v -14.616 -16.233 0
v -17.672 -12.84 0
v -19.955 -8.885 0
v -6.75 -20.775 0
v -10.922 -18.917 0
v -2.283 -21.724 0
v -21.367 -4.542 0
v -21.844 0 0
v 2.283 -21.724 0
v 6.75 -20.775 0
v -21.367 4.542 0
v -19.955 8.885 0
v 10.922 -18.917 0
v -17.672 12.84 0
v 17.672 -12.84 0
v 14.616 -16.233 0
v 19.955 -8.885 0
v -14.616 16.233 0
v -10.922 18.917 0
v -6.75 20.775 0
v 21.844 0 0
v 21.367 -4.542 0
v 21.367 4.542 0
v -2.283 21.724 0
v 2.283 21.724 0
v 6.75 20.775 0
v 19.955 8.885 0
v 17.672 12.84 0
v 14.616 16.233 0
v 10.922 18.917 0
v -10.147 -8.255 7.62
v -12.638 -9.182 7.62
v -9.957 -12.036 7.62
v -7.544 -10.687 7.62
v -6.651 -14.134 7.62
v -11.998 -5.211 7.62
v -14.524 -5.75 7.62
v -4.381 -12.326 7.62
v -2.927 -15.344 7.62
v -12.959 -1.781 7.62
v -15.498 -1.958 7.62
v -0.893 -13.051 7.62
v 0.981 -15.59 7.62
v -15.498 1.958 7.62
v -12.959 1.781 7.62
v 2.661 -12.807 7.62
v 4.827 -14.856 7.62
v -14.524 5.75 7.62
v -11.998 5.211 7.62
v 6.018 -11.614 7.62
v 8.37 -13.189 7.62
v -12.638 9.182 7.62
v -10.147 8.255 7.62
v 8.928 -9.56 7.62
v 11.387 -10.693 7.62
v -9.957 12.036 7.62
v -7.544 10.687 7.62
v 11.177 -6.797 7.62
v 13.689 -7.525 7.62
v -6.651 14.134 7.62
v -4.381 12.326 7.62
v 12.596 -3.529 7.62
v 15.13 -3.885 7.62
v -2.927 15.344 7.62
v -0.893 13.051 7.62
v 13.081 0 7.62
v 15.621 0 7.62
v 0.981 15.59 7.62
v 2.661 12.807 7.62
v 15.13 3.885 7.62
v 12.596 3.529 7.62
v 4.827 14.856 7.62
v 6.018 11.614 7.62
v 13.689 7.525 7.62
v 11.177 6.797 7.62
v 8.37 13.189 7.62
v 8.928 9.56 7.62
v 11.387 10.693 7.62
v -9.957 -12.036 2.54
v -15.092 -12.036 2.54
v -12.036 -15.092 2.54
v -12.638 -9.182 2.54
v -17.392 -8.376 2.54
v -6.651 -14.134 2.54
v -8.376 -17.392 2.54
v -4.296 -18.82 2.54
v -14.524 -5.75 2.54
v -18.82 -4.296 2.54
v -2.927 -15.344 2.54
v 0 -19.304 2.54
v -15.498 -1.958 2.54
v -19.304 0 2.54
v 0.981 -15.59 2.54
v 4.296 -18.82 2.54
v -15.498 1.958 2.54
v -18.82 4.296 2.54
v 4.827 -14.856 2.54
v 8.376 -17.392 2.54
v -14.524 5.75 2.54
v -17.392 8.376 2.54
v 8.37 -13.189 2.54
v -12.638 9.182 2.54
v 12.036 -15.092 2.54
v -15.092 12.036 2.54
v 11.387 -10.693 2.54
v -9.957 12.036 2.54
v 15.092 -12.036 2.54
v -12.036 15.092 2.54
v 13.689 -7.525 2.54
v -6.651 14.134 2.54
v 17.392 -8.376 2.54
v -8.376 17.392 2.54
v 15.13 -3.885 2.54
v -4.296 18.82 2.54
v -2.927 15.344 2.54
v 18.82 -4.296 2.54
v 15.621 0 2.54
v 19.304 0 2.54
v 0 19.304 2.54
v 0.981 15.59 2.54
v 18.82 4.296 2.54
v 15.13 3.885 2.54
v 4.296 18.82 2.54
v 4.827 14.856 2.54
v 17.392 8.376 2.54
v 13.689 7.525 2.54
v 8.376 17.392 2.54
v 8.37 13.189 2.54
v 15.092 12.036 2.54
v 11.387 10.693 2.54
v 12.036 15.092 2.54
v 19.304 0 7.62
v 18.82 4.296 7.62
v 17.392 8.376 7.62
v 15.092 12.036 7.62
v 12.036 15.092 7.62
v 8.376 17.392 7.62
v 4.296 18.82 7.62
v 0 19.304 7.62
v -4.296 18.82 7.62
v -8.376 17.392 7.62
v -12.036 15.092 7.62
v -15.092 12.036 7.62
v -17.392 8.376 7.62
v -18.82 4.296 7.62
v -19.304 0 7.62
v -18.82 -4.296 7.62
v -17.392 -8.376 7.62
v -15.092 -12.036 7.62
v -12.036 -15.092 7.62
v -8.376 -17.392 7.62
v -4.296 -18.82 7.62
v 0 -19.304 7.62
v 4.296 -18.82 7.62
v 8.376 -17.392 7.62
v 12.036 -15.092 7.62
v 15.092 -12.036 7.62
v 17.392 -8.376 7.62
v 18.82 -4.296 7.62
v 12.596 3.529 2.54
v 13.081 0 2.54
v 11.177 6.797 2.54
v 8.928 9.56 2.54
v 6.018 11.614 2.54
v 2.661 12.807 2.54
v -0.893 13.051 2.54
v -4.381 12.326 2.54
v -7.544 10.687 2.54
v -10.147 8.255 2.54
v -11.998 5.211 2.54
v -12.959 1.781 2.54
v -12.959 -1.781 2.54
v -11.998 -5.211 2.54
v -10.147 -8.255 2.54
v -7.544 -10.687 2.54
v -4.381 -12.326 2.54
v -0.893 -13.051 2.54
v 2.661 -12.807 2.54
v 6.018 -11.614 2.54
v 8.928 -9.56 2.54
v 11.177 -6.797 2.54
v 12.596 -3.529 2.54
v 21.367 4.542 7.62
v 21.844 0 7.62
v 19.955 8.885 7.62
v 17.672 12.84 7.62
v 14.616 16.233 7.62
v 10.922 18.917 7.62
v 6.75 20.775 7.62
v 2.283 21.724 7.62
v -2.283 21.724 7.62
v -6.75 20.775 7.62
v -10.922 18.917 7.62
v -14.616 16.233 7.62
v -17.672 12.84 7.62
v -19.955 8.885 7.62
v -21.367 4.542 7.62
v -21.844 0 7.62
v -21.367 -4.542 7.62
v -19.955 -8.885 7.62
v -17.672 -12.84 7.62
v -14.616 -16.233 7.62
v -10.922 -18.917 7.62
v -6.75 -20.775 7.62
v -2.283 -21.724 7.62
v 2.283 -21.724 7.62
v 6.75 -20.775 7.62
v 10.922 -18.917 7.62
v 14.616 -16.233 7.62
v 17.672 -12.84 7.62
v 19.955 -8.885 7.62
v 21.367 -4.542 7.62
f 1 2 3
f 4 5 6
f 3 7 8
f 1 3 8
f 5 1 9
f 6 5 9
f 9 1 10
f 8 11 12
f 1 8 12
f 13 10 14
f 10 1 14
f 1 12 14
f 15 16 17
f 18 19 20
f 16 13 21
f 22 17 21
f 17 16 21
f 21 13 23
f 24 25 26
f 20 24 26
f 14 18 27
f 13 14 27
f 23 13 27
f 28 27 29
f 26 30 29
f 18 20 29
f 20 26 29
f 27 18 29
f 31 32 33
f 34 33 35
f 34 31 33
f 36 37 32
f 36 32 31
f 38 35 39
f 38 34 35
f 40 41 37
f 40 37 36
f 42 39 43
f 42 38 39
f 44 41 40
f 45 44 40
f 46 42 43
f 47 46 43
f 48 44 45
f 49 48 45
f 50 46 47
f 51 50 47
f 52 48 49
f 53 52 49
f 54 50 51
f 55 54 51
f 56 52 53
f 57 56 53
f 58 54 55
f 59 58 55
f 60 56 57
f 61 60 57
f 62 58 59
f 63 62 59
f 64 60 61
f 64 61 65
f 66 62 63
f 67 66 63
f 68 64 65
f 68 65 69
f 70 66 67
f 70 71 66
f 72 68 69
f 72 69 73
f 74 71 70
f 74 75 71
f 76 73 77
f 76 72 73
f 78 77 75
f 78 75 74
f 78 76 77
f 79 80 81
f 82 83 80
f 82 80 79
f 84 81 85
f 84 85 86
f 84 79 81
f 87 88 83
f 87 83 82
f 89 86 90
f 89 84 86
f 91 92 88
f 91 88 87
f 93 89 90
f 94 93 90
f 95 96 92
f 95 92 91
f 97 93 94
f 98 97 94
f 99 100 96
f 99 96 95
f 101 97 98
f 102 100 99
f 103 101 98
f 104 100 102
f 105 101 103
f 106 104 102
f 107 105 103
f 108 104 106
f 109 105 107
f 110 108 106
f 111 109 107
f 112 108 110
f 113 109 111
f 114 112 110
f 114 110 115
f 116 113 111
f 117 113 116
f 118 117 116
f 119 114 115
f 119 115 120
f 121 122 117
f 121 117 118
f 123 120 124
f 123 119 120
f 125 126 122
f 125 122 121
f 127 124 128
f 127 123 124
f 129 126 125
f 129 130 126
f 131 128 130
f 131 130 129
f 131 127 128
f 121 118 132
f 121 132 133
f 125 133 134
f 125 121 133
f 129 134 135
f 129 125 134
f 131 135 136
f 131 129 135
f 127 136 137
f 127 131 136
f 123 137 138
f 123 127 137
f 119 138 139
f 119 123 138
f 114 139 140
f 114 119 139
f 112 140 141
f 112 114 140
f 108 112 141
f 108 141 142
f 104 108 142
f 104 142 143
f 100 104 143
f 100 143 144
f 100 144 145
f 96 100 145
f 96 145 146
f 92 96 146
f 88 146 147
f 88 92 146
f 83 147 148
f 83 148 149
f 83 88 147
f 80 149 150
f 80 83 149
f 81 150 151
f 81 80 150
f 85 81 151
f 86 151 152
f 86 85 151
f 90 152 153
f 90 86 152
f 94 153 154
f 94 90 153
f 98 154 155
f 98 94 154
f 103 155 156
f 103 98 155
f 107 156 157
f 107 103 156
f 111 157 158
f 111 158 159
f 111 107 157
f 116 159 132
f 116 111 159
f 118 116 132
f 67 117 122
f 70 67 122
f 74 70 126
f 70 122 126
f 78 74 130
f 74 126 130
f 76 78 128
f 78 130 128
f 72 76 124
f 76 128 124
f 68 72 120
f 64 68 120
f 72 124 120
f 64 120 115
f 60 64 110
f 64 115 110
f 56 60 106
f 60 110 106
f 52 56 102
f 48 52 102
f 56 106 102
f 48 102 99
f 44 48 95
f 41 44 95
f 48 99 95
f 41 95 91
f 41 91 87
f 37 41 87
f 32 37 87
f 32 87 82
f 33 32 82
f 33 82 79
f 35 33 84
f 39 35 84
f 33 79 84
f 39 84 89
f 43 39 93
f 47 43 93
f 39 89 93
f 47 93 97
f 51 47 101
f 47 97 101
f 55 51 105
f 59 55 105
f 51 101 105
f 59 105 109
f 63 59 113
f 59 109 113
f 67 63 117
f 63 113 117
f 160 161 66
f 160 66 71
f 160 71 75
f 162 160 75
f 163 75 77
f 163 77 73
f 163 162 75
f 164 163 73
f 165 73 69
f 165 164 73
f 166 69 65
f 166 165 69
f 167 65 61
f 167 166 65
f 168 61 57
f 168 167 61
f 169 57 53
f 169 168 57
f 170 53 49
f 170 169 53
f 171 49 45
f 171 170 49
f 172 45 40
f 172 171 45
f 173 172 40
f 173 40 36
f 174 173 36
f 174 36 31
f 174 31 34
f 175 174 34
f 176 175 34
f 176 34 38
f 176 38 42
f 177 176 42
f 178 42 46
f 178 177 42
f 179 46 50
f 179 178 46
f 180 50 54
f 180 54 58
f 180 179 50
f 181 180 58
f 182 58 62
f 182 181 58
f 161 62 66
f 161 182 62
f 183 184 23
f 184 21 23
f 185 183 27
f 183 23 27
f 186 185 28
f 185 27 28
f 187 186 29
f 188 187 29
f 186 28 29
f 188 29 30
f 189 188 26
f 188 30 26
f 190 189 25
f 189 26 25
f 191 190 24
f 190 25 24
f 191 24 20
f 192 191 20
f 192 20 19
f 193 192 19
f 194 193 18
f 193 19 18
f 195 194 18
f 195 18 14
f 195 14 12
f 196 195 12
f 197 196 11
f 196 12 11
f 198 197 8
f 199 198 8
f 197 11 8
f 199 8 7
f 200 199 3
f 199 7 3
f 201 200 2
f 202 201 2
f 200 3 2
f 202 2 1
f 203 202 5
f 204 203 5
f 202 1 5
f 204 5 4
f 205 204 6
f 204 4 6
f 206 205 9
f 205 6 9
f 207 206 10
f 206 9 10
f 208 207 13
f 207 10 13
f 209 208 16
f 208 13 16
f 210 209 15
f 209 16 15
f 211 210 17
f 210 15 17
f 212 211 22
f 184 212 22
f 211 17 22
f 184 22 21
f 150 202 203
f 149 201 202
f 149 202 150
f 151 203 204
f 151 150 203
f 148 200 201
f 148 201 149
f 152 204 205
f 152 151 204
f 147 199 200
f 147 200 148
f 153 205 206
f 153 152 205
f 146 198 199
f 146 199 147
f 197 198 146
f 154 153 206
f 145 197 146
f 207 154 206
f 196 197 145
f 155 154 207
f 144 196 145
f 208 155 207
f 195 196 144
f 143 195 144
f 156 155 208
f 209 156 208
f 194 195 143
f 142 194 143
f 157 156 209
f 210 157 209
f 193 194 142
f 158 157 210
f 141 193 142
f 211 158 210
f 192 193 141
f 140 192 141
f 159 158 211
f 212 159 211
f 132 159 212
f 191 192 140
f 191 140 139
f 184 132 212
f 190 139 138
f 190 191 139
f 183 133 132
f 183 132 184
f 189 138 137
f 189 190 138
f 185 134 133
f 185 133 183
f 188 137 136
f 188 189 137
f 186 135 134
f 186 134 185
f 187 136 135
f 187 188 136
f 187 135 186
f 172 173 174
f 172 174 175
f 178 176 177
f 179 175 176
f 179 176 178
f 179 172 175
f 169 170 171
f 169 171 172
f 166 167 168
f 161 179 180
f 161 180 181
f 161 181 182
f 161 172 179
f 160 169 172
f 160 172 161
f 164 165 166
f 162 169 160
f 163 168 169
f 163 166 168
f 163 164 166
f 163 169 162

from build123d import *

# Parameters (mm, degrees)
F0_R     = 21.844
F1_DEPTH = 2.54
F2_R     = 21.844
F2_R_2   = 19.304
F3_R     = 15.621
F3_R_2   = 13.081
F4_DEPTH = 5.08


with BuildPart() as f1:
    # F0 (on Top) → F1 (new body)
    with BuildSketch(Plane.XY):
        Circle(F0_R)
    extrude(amount=F1_DEPTH)

    # F2 (on face) + F3 (on face) → F4 (join)
    with BuildSketch(Plane.XY.offset(2.54)):
        Circle(F2_R)
        Circle(F2_R_2, mode=Mode.SUBTRACT)
    with BuildSketch(Plane.XY.offset(2.54)):
        Circle(F3_R)
        Circle(F3_R_2, mode=Mode.SUBTRACT)
    extrude(amount=F4_DEPTH)


solid = f1.part
